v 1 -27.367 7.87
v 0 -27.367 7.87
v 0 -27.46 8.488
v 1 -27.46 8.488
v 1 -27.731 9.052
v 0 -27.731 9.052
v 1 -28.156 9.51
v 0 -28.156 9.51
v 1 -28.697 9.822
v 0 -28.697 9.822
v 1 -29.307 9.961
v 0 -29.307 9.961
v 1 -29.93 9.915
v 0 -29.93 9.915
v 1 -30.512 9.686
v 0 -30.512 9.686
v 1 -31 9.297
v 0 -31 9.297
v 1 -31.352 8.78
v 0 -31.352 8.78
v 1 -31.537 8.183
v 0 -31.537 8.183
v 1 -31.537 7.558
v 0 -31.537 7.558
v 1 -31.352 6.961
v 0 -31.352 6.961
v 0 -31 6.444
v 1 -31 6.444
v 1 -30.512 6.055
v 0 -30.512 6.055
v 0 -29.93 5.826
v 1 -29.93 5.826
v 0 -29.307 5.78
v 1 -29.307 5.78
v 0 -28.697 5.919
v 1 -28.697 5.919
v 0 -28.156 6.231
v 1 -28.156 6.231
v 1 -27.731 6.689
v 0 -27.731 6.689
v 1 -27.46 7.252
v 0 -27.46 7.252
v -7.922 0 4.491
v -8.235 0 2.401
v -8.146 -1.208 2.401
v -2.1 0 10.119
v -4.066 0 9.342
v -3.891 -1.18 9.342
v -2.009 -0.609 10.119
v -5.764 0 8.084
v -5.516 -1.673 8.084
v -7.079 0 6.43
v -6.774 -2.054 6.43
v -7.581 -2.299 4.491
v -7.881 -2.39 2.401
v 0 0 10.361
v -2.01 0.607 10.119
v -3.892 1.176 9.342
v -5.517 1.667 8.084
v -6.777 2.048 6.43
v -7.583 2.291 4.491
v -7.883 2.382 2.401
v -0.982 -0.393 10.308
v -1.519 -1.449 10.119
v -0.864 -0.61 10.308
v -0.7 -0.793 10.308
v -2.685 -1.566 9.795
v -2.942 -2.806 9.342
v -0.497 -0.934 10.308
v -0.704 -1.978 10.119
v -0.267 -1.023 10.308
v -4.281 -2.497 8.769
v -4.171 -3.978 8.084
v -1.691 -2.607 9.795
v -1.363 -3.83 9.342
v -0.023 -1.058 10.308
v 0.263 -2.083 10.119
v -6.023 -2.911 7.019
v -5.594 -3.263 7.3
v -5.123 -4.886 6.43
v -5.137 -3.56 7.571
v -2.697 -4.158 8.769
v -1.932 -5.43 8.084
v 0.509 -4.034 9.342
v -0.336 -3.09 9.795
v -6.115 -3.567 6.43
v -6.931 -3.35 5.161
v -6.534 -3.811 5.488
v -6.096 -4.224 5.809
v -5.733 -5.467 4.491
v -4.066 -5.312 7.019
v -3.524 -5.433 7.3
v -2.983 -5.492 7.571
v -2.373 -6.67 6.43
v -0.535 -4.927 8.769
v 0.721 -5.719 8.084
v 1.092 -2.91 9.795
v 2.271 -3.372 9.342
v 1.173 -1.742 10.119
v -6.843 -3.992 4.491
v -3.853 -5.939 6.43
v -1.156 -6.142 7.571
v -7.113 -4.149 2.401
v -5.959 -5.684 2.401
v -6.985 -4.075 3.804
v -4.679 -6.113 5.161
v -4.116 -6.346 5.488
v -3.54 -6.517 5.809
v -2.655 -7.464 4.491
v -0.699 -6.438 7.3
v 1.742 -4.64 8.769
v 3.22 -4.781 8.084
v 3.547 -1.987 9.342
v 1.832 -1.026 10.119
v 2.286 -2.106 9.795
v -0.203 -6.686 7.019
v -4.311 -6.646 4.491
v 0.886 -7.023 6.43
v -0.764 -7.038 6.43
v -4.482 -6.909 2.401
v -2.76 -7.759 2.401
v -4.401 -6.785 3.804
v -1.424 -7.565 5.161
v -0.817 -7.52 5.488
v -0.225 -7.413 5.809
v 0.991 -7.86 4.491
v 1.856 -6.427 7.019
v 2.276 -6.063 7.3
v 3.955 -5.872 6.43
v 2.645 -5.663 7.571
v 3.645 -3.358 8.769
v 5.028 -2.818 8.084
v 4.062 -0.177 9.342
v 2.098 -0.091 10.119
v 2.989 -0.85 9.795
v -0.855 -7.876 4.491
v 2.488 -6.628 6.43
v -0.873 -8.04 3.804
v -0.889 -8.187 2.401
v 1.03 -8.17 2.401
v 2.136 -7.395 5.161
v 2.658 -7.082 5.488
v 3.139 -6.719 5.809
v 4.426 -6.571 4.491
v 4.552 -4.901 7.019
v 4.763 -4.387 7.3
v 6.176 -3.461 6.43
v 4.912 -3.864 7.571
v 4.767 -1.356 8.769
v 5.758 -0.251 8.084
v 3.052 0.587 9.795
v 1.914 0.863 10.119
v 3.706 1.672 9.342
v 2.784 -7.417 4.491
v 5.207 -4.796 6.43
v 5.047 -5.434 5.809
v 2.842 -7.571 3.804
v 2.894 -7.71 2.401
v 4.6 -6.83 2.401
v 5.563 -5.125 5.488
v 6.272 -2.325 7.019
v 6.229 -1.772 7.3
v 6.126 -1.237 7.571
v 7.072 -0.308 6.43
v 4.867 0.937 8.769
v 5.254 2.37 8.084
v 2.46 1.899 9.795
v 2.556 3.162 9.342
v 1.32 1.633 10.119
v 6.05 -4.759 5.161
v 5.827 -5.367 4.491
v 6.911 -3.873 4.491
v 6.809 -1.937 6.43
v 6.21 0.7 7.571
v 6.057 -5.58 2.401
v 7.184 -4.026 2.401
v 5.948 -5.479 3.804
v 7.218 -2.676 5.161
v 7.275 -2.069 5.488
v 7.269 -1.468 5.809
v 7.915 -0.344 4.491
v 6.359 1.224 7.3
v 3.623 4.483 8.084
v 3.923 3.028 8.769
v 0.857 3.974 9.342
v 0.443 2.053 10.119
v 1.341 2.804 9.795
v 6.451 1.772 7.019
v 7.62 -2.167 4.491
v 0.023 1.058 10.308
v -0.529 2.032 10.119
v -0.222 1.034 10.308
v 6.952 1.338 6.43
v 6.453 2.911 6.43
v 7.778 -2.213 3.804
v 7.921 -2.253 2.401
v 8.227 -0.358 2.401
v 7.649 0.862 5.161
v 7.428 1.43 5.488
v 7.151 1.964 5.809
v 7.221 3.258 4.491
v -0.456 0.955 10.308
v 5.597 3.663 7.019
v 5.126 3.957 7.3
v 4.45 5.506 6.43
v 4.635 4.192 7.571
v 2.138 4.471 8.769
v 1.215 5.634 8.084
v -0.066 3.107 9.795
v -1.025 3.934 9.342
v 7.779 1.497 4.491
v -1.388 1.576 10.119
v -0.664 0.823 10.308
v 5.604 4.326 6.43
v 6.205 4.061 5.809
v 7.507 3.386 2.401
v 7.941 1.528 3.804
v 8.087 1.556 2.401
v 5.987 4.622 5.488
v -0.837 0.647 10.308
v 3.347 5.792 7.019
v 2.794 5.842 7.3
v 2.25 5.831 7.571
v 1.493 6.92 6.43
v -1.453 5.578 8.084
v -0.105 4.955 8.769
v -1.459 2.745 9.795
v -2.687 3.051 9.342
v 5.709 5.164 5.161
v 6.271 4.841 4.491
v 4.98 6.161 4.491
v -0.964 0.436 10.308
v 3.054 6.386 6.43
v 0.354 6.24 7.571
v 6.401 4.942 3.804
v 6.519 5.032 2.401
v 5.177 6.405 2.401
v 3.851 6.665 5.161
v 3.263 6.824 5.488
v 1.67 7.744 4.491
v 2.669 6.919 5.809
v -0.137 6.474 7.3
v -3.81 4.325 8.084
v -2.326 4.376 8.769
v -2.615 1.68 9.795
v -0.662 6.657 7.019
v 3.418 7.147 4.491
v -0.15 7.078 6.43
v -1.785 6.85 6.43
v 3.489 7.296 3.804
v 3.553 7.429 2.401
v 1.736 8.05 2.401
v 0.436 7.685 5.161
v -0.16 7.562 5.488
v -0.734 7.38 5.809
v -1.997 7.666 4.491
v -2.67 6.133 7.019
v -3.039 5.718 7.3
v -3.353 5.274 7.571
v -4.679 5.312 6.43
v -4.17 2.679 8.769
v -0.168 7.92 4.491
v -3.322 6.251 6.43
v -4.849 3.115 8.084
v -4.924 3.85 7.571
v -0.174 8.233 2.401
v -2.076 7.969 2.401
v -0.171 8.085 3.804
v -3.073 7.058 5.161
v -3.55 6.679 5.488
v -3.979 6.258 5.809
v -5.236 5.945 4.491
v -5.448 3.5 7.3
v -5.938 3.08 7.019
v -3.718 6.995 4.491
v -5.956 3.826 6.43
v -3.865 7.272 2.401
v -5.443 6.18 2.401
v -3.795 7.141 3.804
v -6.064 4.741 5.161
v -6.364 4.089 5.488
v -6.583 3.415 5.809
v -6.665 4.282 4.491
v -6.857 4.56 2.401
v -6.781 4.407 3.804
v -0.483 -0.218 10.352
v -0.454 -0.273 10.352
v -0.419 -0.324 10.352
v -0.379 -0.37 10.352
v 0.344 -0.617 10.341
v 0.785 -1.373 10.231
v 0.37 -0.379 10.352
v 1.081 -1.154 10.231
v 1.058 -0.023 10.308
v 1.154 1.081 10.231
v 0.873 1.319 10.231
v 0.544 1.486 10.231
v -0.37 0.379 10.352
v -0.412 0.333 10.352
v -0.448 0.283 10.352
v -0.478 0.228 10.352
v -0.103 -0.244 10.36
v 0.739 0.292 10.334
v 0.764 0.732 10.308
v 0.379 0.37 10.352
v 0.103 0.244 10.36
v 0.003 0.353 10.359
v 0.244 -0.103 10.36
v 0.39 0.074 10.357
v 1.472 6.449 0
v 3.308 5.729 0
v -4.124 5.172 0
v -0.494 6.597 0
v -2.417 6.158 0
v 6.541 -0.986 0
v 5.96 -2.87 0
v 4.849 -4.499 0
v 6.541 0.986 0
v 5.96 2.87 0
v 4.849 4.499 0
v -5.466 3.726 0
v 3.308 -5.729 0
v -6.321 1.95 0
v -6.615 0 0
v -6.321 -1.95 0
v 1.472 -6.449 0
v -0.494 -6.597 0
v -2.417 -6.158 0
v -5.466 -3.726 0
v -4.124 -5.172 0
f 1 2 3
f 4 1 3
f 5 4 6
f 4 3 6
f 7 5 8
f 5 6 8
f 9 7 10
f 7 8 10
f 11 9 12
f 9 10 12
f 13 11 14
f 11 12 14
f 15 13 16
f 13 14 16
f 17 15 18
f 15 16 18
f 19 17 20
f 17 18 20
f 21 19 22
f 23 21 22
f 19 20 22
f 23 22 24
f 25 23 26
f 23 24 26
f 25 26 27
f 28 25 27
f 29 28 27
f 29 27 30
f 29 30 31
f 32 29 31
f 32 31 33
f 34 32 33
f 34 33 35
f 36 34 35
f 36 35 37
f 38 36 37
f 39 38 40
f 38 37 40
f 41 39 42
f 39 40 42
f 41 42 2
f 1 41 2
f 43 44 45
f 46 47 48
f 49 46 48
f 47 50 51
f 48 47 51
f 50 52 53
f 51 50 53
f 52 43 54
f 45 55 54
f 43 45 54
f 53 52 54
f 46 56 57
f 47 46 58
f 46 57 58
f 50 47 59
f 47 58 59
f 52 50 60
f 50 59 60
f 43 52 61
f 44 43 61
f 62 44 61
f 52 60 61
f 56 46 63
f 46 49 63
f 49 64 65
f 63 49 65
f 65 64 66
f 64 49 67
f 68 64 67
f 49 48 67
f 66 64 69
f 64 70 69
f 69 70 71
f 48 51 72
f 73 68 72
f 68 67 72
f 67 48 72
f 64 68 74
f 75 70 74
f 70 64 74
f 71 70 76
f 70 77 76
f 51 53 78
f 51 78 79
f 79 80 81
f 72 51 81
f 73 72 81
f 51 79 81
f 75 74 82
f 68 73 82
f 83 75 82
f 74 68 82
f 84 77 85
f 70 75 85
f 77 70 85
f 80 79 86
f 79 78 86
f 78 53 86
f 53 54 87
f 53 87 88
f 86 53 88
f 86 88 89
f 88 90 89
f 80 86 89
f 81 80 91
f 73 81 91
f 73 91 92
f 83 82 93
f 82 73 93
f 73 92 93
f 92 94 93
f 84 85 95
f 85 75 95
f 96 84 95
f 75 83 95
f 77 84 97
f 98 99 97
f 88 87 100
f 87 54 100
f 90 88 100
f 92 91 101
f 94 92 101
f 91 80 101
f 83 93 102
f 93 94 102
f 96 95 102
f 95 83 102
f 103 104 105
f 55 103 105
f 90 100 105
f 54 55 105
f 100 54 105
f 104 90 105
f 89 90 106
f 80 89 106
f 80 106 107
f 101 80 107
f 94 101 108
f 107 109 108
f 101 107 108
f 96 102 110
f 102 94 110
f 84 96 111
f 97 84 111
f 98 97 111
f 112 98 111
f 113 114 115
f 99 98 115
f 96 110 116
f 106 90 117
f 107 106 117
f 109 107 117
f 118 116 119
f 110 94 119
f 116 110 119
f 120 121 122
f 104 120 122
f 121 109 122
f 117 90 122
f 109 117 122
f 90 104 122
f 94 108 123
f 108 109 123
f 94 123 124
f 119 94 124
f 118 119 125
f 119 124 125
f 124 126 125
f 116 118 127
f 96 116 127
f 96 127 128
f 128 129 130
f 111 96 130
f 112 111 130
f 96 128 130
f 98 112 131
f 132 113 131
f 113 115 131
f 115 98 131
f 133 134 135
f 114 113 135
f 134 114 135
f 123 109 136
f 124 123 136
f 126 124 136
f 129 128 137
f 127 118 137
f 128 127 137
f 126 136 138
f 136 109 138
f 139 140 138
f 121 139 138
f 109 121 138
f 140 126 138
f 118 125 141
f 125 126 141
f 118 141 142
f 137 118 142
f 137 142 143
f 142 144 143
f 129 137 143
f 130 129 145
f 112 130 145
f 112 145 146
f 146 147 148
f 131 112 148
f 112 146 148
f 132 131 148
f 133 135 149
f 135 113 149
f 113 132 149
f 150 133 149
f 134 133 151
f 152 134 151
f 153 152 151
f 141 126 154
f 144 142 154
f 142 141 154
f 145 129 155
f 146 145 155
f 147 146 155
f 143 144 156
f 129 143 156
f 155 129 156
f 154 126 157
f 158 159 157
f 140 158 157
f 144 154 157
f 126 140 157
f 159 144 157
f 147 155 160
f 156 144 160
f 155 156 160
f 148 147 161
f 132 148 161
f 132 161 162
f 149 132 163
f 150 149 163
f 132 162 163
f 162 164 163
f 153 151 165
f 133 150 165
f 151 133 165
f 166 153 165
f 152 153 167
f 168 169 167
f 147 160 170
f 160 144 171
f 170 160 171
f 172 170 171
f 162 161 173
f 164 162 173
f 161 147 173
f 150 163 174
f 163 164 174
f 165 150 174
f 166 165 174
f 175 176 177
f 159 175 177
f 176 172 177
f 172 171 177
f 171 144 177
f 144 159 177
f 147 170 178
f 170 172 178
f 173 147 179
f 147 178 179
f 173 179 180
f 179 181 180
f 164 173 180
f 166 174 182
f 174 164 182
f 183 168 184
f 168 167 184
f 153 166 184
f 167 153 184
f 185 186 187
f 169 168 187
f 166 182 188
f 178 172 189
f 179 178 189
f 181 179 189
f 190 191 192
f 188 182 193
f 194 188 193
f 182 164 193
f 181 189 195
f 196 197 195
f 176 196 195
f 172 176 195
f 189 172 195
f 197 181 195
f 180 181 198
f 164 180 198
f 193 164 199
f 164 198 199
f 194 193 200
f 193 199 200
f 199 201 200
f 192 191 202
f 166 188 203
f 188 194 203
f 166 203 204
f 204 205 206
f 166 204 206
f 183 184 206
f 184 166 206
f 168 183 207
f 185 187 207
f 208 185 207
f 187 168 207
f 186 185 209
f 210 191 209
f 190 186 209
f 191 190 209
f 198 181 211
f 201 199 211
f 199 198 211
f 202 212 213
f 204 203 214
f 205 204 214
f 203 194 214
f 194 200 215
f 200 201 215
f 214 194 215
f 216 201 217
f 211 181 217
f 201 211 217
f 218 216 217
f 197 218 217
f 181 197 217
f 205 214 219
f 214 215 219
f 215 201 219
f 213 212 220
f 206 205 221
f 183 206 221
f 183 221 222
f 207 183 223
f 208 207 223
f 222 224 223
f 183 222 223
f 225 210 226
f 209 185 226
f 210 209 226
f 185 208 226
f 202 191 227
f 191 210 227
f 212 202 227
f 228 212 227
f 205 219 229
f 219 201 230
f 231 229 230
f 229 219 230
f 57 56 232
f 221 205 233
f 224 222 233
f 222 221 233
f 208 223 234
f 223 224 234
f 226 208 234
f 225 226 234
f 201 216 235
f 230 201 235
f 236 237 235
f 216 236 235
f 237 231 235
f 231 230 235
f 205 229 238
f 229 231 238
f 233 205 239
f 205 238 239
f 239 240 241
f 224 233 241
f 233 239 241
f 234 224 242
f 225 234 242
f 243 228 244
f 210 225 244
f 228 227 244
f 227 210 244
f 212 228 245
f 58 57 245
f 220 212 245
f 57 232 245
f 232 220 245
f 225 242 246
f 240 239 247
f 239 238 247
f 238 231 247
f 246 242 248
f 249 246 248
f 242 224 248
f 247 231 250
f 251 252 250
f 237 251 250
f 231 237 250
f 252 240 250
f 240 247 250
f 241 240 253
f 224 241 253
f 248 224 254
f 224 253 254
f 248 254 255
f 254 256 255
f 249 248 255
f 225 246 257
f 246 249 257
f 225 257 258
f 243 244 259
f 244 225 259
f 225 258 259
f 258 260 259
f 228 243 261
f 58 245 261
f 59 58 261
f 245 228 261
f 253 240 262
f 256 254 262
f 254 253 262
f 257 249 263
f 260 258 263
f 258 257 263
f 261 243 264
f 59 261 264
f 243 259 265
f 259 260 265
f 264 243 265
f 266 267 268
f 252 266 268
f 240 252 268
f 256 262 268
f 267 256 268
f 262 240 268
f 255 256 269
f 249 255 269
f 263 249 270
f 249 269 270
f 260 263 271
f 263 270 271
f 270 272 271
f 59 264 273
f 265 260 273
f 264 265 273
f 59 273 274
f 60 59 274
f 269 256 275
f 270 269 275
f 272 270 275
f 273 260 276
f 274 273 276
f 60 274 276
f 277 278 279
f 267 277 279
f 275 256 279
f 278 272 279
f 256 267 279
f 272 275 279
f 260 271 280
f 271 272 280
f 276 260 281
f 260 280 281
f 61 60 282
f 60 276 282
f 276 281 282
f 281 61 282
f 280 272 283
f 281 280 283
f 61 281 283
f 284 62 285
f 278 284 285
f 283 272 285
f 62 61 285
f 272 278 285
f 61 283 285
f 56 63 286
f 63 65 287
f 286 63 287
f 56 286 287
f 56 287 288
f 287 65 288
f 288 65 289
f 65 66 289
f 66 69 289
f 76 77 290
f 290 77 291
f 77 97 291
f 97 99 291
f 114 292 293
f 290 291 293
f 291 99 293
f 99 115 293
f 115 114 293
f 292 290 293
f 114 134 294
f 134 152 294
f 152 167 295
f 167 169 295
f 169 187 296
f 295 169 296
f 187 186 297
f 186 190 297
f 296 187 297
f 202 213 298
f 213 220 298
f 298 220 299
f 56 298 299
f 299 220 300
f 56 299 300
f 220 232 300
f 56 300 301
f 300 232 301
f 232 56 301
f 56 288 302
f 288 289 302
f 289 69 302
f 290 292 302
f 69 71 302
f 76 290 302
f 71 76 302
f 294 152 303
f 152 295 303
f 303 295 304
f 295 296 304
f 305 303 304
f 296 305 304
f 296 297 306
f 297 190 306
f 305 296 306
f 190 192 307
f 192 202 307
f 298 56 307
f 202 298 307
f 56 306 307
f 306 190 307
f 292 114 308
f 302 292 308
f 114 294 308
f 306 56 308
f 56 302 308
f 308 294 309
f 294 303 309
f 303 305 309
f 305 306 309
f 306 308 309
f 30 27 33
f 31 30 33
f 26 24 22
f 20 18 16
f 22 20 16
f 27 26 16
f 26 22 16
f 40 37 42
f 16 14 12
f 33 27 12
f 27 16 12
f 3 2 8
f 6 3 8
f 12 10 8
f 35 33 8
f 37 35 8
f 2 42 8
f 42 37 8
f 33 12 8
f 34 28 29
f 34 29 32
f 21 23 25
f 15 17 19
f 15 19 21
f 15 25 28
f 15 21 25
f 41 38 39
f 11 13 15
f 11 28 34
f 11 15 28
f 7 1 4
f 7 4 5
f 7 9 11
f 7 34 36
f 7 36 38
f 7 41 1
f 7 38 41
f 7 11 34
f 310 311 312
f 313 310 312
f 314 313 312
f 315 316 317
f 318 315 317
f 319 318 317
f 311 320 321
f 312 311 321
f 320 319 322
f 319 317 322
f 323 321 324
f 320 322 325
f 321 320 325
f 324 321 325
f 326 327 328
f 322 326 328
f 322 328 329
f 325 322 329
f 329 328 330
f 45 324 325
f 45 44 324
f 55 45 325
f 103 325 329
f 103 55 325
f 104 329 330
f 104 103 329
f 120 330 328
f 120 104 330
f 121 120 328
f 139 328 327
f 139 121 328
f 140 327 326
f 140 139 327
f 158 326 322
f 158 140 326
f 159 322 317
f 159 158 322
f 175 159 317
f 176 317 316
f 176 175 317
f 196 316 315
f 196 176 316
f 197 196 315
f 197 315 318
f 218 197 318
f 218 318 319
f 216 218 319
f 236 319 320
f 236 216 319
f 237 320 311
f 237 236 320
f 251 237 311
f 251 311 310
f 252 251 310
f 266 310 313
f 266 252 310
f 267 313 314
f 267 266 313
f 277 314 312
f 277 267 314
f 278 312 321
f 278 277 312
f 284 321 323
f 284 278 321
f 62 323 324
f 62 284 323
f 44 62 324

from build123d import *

# Parameters (mm, degrees)
F3_R     = 2.0966319248
F4_DEPTH = 1


# Not quite as in the source:
# - a fillet or chamfer that OpenCascade refuses, or shapes differently, is made with other operations: its cross-section is extruded or revolved along the edge and cut away or added


with BuildPart() as f1:
    # F0 (on Front) → F1 (revolve)
    with BuildSketch(Plane.XZ):
        with BuildLine():
            Line((-7.9164700583, 0), (0, 0))
            Line((0, 0), (0, 10.3605724871))
            ThreePointArc((0, 10.3605724871), (-6.5713696188, 7.1769714425), (-7.9164700583, 0))
        make_face()
    revolve(axis=Axis((0, 0, 5.1802862436), (0, 0, 1)))

    # F2: chamfer of 1 x 2 on 1 edges, made by hand

    # F2_s1 → F2_t2 (revolve, cut)
    with BuildSketch(Plane.XZ):
        with BuildLine():
            Line((-6.5703214108, -0.0663148568), (-8.2799279758, 2.467285589))
            Line((-8.2799279758, 2.467285589), (-8.3199215099, 2.4680047775))
            ThreePointArc((-8.3199215099, 2.4680047775), (-8.2103524238, 1.2192637953), (-7.9548909557, -0.0111281015))
            Line((-7.9548909557, -0.0111281015), (-7.9164700583, -0.04))
            ThreePointArc((-7.9164700583, -0.04), (-7.2433957345, -0.04), (-6.5703214108, -0.1063148568))
            Line((-6.5703214108, -0.1063148568), (-6.5703214108, -0.0663148568))
        make_face()
    revolve(axis=Axis((0, 0, 0), (0, 0, 1)), mode=Mode.SUBTRACT)


with BuildPart() as f4:
    # F3 (on Right) → F4 (new body)
    with BuildSketch(Plane.YZ):
        with Locations((-29.4634513557, 7.8704915941)):
            Circle(F3_R)
    extrude(amount=F4_DEPTH)


solid = Compound([f1.part, f4.part])
